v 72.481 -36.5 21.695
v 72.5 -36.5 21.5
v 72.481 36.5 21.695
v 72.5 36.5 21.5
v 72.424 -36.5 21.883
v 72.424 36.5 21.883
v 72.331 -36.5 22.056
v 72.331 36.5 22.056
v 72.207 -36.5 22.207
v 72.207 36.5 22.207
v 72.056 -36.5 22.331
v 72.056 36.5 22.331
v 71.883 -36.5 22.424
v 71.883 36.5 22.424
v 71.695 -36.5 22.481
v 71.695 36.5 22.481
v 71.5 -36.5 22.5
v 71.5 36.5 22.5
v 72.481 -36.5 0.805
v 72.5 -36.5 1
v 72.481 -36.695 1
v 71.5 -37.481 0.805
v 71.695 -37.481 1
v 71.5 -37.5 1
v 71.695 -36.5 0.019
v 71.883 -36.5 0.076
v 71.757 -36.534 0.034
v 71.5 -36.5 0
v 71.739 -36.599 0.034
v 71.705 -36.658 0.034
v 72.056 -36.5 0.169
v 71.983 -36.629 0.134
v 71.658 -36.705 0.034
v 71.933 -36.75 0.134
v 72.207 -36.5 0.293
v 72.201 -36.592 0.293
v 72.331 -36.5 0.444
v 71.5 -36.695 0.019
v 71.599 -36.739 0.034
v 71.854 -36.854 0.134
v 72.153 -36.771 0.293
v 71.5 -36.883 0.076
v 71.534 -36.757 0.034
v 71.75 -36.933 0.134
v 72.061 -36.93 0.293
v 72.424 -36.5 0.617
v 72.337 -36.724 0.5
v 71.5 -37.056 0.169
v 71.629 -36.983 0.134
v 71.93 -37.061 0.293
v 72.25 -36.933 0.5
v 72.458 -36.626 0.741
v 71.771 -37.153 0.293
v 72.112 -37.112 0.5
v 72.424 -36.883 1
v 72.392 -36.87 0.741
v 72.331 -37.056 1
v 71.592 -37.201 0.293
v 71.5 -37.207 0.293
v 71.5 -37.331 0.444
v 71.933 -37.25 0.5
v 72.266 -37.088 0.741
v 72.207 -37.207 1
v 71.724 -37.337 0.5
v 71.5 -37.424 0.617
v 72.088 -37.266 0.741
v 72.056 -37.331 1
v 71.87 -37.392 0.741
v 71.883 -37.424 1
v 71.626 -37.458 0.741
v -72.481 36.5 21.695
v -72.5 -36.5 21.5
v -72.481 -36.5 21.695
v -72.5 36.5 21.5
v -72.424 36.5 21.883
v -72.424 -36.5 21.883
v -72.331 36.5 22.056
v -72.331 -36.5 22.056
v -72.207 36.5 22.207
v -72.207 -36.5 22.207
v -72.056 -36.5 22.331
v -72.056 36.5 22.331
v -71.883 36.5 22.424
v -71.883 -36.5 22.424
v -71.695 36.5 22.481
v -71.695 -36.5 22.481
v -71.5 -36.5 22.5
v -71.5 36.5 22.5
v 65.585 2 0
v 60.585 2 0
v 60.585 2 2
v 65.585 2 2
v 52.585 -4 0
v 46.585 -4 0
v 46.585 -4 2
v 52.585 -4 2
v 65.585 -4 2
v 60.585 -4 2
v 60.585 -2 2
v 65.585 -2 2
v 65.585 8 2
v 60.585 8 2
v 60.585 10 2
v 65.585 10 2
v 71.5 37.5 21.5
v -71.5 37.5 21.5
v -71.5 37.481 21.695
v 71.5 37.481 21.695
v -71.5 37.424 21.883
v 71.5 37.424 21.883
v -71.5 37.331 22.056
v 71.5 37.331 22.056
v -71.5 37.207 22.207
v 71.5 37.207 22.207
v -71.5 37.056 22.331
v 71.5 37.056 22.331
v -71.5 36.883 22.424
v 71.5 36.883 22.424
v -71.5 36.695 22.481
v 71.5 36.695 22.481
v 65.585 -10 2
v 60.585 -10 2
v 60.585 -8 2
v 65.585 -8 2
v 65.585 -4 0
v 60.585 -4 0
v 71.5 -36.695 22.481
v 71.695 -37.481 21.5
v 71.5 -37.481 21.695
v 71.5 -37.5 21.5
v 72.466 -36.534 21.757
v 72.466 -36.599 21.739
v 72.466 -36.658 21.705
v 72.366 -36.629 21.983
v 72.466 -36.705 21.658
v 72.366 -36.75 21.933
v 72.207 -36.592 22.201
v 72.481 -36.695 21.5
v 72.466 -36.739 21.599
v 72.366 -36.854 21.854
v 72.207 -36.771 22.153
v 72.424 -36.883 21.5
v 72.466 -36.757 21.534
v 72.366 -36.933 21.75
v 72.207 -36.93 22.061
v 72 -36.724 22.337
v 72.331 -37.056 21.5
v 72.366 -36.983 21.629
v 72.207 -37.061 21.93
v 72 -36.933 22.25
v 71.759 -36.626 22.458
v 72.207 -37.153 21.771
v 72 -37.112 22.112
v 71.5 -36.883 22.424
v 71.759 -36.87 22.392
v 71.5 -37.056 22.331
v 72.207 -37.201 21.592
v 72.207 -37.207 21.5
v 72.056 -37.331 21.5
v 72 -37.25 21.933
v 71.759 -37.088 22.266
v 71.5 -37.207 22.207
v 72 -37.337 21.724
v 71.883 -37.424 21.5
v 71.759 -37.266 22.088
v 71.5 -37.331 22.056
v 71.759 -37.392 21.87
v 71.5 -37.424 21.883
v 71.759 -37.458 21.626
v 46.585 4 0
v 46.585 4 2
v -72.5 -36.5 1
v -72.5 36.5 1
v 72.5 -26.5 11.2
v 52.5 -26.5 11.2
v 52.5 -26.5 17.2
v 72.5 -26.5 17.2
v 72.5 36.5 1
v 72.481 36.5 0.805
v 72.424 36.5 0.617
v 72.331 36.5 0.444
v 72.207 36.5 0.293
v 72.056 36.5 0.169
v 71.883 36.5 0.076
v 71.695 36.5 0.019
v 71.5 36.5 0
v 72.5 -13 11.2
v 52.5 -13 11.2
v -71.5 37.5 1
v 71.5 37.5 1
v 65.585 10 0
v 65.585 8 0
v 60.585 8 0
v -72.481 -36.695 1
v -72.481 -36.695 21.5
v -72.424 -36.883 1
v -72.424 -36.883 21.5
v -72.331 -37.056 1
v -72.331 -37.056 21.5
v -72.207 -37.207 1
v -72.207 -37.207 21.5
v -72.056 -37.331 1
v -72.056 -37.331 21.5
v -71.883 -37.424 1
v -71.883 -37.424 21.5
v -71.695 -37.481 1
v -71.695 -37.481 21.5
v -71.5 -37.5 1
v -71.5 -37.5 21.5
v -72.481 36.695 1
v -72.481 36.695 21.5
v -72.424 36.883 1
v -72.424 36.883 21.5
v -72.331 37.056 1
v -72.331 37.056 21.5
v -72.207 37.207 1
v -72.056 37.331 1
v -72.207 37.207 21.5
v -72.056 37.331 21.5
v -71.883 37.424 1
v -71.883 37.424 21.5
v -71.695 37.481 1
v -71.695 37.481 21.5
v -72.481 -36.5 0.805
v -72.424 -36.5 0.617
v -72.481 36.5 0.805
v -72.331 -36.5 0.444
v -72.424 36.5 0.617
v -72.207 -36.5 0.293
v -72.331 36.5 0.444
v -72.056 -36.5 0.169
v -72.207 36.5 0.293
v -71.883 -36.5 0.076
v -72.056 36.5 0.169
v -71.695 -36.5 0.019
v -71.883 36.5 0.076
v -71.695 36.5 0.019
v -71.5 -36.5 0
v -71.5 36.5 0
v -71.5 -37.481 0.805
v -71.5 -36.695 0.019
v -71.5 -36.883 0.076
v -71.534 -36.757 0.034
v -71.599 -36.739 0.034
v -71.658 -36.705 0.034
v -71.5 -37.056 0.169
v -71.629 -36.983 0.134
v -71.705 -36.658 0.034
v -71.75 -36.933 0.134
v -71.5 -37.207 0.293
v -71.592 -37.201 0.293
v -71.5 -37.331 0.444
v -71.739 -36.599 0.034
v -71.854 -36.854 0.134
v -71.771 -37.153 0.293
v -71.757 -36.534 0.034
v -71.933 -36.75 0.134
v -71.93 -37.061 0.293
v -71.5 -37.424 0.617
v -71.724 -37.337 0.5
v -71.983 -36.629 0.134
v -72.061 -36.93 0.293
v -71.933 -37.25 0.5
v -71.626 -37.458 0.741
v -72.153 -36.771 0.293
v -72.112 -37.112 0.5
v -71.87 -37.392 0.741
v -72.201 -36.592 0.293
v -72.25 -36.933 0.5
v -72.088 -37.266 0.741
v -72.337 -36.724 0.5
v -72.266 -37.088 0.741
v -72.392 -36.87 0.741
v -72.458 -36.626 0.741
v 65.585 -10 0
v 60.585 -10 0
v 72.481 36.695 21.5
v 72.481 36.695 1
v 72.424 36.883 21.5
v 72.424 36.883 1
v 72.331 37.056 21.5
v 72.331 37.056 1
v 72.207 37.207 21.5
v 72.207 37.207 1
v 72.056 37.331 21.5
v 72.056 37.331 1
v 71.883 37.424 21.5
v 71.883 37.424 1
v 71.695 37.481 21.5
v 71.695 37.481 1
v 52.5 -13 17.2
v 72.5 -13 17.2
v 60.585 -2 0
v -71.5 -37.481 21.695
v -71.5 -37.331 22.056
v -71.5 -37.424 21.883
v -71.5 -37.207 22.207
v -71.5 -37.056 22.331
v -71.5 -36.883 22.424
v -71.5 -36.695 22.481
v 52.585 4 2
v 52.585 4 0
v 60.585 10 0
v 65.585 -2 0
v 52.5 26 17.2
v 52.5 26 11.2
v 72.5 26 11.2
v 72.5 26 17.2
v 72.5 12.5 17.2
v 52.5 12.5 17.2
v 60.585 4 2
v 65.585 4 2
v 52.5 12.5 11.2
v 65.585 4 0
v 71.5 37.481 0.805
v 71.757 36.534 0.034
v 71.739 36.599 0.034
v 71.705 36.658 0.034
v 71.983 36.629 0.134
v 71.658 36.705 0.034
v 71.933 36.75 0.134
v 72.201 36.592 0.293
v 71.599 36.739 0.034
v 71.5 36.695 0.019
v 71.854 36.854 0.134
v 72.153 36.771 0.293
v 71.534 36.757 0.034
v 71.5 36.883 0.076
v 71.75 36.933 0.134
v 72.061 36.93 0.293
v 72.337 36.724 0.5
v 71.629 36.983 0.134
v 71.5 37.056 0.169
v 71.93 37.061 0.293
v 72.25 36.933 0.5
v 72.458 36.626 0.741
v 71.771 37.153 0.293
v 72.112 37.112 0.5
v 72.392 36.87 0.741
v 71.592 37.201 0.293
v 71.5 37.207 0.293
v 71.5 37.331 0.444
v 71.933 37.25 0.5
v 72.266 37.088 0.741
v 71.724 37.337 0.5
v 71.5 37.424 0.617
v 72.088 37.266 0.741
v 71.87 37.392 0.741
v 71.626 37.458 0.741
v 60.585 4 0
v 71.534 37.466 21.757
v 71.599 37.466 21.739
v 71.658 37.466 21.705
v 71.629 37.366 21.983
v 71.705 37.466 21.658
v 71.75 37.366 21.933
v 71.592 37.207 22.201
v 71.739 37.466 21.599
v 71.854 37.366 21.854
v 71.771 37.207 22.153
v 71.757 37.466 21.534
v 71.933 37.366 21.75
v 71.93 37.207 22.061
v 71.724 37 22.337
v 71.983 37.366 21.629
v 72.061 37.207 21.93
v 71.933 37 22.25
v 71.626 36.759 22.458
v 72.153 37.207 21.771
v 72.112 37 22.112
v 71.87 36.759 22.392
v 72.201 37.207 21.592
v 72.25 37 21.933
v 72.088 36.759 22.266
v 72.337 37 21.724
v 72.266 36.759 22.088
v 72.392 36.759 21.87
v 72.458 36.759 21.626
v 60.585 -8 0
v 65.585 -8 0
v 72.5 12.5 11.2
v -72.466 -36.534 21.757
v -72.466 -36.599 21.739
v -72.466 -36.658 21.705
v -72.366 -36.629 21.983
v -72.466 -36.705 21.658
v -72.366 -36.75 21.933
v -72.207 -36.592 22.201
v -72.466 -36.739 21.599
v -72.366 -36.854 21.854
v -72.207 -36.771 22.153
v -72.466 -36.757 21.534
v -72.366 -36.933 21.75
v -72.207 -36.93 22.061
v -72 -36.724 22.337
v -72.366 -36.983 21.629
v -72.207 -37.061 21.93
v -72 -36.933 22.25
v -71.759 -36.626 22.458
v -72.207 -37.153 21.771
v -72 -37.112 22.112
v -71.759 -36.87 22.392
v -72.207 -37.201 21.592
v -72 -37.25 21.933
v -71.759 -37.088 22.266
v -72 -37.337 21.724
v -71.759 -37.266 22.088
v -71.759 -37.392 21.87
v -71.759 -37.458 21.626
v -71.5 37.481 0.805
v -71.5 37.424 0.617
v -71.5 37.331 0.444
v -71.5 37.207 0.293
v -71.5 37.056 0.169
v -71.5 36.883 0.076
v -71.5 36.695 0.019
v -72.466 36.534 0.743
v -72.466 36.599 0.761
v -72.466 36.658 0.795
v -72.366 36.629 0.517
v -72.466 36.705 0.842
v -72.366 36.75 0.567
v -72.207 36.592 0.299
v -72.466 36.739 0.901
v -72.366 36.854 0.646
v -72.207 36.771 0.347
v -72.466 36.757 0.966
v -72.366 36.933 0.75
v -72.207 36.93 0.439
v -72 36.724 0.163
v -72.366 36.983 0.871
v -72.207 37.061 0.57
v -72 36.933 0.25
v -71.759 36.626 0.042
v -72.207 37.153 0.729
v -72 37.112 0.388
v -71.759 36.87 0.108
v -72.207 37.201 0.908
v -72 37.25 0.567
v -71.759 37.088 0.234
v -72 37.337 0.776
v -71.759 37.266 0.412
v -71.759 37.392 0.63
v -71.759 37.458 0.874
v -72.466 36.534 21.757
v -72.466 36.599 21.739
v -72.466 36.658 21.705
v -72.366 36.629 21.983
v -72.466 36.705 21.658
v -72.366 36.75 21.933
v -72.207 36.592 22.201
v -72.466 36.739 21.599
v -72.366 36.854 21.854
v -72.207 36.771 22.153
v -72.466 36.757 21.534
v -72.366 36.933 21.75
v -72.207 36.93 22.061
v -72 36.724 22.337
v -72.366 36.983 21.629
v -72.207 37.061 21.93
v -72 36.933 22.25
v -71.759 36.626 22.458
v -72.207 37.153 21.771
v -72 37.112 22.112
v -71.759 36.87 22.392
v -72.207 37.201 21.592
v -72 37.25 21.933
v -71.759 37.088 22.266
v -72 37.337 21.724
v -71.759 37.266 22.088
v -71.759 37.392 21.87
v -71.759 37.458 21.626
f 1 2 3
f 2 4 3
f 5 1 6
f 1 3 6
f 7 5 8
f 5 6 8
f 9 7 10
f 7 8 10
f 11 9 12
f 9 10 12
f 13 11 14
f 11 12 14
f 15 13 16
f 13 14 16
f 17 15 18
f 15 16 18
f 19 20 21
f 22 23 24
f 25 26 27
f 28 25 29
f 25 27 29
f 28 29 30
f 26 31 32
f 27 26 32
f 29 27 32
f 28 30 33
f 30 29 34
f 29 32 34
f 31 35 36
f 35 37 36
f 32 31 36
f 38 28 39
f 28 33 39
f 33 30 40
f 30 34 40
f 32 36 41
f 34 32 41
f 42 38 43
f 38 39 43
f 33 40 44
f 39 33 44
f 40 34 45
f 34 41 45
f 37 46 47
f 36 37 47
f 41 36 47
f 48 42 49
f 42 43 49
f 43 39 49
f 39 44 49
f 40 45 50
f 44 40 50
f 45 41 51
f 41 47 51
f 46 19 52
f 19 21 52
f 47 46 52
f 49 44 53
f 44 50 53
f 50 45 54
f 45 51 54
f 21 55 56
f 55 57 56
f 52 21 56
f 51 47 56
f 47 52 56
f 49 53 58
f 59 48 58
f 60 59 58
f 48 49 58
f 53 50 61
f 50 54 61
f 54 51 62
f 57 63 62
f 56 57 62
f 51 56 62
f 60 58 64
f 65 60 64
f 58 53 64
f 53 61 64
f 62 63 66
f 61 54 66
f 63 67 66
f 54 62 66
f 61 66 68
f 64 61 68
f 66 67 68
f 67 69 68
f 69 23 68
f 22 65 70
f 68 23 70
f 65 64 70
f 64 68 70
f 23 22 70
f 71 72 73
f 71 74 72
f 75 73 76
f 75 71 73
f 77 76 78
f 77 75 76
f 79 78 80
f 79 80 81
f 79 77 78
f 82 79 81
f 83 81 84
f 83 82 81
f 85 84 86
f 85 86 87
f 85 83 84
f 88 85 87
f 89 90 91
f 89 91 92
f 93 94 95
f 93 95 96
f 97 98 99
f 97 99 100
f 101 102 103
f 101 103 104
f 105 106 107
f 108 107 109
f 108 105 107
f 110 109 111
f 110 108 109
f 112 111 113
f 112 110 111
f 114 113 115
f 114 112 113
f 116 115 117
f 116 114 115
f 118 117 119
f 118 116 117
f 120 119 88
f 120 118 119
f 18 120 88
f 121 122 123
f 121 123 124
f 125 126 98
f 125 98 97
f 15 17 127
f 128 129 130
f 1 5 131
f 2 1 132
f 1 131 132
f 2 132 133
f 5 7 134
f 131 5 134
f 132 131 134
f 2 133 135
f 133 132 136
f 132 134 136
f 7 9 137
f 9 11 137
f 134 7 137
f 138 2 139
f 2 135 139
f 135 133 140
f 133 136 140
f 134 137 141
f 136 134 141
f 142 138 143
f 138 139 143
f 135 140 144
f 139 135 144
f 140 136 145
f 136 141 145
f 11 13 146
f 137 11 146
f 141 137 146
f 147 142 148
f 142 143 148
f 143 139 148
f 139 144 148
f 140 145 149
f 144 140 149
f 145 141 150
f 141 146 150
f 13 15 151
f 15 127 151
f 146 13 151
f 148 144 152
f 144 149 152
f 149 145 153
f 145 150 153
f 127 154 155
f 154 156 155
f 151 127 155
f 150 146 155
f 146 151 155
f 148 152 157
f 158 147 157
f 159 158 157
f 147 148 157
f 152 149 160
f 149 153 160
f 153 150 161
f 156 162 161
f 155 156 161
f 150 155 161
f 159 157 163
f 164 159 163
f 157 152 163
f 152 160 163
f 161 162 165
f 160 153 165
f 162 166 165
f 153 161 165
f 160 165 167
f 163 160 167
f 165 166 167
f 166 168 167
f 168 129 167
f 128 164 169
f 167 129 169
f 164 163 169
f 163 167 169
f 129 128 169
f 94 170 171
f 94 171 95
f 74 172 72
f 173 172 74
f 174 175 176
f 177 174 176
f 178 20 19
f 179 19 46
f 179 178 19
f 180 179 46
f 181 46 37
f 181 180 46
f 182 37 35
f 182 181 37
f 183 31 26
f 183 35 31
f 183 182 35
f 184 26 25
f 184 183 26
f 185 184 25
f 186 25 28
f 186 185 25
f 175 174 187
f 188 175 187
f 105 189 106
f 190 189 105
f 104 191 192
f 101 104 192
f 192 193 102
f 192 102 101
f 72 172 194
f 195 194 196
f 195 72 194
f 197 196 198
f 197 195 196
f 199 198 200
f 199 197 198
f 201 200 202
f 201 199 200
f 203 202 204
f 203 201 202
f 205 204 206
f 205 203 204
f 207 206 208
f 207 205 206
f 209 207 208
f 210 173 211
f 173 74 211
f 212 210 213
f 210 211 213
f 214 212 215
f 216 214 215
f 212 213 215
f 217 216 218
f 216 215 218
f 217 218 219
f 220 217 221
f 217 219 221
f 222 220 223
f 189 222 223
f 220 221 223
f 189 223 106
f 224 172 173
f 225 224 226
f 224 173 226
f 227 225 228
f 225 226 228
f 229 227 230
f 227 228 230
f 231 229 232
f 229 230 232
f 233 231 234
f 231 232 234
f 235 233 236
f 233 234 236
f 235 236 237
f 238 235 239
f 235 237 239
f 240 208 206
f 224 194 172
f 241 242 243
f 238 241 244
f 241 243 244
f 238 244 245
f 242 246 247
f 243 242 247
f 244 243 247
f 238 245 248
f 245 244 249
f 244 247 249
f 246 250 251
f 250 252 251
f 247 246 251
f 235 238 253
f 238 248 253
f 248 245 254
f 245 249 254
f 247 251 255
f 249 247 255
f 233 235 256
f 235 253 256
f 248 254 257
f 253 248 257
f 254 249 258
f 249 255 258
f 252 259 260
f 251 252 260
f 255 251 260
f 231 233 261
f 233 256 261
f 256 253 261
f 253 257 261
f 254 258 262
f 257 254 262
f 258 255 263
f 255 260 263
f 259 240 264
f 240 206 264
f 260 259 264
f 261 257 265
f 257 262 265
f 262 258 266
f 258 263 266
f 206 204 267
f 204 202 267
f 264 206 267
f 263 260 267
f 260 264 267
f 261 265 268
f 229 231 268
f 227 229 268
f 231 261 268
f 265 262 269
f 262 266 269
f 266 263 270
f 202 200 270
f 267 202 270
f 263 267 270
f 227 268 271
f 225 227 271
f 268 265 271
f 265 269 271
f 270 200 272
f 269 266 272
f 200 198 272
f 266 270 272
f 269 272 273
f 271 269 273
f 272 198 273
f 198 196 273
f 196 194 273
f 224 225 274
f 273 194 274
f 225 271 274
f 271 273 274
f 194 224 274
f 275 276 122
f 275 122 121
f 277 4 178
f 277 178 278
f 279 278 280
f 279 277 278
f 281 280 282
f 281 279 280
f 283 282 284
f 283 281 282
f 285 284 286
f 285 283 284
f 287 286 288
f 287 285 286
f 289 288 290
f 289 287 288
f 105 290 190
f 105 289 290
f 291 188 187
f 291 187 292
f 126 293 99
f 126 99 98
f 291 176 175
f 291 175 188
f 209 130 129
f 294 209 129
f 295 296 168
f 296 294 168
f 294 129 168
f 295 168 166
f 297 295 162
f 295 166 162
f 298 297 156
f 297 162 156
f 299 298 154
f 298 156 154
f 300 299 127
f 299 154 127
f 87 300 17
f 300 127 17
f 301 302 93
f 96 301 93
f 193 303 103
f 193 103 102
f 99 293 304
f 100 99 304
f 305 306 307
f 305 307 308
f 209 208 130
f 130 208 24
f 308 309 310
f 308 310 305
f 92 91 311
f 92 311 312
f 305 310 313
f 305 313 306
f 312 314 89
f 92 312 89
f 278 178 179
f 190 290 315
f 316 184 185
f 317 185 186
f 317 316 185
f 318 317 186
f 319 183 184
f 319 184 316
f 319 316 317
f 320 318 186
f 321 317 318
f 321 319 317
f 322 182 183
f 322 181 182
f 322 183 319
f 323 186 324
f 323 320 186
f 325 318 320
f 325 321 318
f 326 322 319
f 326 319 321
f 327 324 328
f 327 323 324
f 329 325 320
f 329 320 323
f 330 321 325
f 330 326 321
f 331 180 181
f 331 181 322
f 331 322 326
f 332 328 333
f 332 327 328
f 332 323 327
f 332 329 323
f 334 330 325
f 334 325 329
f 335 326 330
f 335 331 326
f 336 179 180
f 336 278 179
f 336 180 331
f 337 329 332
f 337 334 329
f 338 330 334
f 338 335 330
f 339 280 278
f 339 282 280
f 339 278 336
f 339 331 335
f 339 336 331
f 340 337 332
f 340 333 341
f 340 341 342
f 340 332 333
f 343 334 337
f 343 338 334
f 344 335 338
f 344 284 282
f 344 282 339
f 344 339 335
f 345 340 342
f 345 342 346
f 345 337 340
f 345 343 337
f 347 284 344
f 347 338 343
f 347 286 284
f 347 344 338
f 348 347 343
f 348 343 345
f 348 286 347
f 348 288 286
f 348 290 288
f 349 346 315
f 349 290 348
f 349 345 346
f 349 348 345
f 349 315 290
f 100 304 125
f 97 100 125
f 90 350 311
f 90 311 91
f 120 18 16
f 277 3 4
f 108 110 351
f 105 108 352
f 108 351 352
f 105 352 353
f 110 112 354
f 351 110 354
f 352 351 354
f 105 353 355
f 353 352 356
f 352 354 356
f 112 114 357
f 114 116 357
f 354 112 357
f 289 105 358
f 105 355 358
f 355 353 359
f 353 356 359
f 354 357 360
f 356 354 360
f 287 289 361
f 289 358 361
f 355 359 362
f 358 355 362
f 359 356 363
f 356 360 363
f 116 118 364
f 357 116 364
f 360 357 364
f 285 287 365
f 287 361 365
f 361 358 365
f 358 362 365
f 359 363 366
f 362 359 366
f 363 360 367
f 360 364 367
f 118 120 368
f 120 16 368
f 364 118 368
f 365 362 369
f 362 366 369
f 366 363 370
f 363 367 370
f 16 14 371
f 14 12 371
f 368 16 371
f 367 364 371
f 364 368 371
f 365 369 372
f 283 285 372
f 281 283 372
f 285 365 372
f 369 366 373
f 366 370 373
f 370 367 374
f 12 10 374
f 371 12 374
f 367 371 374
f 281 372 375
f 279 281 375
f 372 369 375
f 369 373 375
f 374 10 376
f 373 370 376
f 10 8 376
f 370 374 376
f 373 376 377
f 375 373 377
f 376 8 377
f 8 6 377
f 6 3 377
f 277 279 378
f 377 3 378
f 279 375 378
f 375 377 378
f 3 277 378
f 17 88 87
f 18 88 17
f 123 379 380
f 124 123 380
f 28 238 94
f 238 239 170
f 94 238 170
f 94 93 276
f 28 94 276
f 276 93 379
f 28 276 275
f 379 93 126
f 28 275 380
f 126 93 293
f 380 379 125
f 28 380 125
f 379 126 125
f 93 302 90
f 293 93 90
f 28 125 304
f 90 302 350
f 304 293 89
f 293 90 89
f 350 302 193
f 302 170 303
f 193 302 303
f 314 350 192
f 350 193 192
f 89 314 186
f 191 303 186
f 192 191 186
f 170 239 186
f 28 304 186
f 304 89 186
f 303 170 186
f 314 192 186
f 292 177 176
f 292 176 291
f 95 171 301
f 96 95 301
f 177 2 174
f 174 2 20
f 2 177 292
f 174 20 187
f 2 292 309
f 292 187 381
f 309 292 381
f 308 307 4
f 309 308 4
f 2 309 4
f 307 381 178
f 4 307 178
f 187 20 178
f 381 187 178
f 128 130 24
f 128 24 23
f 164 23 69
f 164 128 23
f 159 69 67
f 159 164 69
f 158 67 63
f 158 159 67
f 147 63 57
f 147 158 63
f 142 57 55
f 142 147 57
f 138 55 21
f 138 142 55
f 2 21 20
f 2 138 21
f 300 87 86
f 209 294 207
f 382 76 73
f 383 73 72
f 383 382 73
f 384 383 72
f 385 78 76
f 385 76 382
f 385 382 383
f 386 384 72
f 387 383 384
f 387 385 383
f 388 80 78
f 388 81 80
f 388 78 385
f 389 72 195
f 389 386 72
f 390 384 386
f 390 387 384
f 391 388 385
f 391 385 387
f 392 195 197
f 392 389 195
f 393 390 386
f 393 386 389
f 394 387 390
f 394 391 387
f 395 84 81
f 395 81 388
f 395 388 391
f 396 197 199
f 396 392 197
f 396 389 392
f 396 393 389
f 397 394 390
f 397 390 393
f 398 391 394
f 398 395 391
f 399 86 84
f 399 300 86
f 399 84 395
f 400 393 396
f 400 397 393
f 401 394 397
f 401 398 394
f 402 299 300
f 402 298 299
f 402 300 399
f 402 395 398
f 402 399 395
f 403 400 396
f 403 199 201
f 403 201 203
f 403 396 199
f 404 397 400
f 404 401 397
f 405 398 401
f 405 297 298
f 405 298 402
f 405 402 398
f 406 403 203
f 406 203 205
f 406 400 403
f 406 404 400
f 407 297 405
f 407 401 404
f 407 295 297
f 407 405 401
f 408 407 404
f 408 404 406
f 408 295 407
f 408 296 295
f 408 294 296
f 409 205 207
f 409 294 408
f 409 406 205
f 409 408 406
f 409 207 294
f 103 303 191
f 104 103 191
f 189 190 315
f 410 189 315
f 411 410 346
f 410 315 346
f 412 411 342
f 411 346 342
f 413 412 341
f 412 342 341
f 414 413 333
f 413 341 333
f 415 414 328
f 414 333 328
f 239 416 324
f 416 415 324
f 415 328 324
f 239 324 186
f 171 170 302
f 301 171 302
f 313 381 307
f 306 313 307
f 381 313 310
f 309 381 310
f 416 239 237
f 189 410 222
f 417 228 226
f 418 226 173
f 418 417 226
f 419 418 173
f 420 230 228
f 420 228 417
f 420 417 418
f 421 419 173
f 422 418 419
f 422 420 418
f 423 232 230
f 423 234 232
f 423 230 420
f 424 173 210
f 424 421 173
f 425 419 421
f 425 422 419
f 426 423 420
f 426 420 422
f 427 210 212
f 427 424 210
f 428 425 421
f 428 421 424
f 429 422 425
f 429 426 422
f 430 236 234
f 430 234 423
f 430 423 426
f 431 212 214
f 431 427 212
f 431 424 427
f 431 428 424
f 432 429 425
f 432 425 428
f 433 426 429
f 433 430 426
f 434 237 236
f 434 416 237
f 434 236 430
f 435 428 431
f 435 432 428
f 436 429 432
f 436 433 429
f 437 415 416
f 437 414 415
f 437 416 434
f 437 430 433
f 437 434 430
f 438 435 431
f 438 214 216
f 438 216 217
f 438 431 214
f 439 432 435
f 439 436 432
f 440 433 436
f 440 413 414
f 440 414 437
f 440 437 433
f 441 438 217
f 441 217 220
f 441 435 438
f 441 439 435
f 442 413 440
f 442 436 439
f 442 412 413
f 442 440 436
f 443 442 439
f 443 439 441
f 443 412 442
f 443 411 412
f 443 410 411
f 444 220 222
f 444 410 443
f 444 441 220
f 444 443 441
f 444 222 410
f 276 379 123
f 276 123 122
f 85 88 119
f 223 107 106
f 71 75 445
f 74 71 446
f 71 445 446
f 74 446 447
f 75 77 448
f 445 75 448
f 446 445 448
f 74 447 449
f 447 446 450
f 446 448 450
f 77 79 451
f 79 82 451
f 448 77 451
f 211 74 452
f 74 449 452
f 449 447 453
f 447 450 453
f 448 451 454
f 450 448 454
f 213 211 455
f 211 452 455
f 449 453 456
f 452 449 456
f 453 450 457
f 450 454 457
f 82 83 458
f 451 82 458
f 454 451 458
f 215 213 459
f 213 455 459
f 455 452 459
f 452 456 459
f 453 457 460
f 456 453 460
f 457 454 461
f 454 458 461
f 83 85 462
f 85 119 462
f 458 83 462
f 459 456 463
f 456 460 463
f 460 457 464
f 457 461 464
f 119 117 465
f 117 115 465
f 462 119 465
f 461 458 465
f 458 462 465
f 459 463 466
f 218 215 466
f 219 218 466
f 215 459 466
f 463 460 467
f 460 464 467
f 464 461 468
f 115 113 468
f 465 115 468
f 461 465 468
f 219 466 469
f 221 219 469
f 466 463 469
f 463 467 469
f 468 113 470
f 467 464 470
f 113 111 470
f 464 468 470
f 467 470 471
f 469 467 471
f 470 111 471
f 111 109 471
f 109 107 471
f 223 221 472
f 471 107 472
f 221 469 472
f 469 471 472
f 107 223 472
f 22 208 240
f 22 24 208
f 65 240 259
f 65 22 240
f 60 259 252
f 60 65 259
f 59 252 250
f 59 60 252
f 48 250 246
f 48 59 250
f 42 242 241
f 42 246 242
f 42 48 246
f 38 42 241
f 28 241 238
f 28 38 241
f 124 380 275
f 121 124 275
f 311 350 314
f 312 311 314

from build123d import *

# Parameters (mm, degrees)
SKETCH_W        = 145
SKETCH_H        = 75
PAD_DEPTH       = 22.5
FILLET_R        = 1
SKETCH001_W     = 5
SKETCH001_H     = 2
SKETCH001_W_2   = 6
SKETCH001_H_2   = 8
POCKET_DEPTH    = 2
SKETCH002_W     = 13.5
SKETCH002_H     = 6
POCKET001_DEPTH = 20


with BuildPart() as part:
    # Sketch → Pad (new body)
    with BuildSketch(Plane.XY):
        Rectangle(SKETCH_W, SKETCH_H)
    extrude(amount=PAD_DEPTH)

    # Fillet
    fillet_edges = [part.edges().sort_by_distance(p)[0] for p in [
        (0, -37.5, 22.5),
        (72.5, 0, 22.5),
        (0, 37.5, 22.5),
        (-72.5, 0, 22.5),
        (-72.5, -37.5, 11.25),
        (72.5, -37.5, 11.25),
        (72.5, 37.5, 11.25),
        (72.5, 0, 0),
        (0, -37.5, 0),
        (0, 37.5, 0),
        (-72.5, 0, 0),
        (-72.5, 37.5, 11.25),
    ]]
    fillet(fillet_edges, radius=FILLET_R)

    # Sketch001 (on Face13 of Fillet) → Pocket (cut)
    with BuildSketch(Plane(origin=(0, 0, 0), x_dir=(1, 0, 0), z_dir=(0, 0, -1))):
        with Locations((63.084595, 9)):
            Rectangle(SKETCH001_W, SKETCH001_H)
        with Locations((63.084595, 3)):
            Rectangle(SKETCH001_W, SKETCH001_H)
        with Locations((63.084595, -3)):
            Rectangle(SKETCH001_W, SKETCH001_H)
        with Locations((63.084595, -9)):
            Rectangle(SKETCH001_W, SKETCH001_H)
        with Locations((49.584595, 0)):
            Rectangle(SKETCH001_W_2, SKETCH001_H_2)
    extrude(amount=-POCKET_DEPTH, mode=Mode.SUBTRACT)

    # Sketch002 (on Face12 of Pocket) → Pocket001 (cut)
    with BuildSketch(Plane.YZ.offset(72.5)):
        with Locations((19.25, 14.2)):
            Rectangle(SKETCH002_W, SKETCH002_H)
        with Locations((-19.75, 14.2)):
            Rectangle(SKETCH002_W, SKETCH002_H)
    extrude(amount=-POCKET001_DEPTH, mode=Mode.SUBTRACT)


solid = part.part
